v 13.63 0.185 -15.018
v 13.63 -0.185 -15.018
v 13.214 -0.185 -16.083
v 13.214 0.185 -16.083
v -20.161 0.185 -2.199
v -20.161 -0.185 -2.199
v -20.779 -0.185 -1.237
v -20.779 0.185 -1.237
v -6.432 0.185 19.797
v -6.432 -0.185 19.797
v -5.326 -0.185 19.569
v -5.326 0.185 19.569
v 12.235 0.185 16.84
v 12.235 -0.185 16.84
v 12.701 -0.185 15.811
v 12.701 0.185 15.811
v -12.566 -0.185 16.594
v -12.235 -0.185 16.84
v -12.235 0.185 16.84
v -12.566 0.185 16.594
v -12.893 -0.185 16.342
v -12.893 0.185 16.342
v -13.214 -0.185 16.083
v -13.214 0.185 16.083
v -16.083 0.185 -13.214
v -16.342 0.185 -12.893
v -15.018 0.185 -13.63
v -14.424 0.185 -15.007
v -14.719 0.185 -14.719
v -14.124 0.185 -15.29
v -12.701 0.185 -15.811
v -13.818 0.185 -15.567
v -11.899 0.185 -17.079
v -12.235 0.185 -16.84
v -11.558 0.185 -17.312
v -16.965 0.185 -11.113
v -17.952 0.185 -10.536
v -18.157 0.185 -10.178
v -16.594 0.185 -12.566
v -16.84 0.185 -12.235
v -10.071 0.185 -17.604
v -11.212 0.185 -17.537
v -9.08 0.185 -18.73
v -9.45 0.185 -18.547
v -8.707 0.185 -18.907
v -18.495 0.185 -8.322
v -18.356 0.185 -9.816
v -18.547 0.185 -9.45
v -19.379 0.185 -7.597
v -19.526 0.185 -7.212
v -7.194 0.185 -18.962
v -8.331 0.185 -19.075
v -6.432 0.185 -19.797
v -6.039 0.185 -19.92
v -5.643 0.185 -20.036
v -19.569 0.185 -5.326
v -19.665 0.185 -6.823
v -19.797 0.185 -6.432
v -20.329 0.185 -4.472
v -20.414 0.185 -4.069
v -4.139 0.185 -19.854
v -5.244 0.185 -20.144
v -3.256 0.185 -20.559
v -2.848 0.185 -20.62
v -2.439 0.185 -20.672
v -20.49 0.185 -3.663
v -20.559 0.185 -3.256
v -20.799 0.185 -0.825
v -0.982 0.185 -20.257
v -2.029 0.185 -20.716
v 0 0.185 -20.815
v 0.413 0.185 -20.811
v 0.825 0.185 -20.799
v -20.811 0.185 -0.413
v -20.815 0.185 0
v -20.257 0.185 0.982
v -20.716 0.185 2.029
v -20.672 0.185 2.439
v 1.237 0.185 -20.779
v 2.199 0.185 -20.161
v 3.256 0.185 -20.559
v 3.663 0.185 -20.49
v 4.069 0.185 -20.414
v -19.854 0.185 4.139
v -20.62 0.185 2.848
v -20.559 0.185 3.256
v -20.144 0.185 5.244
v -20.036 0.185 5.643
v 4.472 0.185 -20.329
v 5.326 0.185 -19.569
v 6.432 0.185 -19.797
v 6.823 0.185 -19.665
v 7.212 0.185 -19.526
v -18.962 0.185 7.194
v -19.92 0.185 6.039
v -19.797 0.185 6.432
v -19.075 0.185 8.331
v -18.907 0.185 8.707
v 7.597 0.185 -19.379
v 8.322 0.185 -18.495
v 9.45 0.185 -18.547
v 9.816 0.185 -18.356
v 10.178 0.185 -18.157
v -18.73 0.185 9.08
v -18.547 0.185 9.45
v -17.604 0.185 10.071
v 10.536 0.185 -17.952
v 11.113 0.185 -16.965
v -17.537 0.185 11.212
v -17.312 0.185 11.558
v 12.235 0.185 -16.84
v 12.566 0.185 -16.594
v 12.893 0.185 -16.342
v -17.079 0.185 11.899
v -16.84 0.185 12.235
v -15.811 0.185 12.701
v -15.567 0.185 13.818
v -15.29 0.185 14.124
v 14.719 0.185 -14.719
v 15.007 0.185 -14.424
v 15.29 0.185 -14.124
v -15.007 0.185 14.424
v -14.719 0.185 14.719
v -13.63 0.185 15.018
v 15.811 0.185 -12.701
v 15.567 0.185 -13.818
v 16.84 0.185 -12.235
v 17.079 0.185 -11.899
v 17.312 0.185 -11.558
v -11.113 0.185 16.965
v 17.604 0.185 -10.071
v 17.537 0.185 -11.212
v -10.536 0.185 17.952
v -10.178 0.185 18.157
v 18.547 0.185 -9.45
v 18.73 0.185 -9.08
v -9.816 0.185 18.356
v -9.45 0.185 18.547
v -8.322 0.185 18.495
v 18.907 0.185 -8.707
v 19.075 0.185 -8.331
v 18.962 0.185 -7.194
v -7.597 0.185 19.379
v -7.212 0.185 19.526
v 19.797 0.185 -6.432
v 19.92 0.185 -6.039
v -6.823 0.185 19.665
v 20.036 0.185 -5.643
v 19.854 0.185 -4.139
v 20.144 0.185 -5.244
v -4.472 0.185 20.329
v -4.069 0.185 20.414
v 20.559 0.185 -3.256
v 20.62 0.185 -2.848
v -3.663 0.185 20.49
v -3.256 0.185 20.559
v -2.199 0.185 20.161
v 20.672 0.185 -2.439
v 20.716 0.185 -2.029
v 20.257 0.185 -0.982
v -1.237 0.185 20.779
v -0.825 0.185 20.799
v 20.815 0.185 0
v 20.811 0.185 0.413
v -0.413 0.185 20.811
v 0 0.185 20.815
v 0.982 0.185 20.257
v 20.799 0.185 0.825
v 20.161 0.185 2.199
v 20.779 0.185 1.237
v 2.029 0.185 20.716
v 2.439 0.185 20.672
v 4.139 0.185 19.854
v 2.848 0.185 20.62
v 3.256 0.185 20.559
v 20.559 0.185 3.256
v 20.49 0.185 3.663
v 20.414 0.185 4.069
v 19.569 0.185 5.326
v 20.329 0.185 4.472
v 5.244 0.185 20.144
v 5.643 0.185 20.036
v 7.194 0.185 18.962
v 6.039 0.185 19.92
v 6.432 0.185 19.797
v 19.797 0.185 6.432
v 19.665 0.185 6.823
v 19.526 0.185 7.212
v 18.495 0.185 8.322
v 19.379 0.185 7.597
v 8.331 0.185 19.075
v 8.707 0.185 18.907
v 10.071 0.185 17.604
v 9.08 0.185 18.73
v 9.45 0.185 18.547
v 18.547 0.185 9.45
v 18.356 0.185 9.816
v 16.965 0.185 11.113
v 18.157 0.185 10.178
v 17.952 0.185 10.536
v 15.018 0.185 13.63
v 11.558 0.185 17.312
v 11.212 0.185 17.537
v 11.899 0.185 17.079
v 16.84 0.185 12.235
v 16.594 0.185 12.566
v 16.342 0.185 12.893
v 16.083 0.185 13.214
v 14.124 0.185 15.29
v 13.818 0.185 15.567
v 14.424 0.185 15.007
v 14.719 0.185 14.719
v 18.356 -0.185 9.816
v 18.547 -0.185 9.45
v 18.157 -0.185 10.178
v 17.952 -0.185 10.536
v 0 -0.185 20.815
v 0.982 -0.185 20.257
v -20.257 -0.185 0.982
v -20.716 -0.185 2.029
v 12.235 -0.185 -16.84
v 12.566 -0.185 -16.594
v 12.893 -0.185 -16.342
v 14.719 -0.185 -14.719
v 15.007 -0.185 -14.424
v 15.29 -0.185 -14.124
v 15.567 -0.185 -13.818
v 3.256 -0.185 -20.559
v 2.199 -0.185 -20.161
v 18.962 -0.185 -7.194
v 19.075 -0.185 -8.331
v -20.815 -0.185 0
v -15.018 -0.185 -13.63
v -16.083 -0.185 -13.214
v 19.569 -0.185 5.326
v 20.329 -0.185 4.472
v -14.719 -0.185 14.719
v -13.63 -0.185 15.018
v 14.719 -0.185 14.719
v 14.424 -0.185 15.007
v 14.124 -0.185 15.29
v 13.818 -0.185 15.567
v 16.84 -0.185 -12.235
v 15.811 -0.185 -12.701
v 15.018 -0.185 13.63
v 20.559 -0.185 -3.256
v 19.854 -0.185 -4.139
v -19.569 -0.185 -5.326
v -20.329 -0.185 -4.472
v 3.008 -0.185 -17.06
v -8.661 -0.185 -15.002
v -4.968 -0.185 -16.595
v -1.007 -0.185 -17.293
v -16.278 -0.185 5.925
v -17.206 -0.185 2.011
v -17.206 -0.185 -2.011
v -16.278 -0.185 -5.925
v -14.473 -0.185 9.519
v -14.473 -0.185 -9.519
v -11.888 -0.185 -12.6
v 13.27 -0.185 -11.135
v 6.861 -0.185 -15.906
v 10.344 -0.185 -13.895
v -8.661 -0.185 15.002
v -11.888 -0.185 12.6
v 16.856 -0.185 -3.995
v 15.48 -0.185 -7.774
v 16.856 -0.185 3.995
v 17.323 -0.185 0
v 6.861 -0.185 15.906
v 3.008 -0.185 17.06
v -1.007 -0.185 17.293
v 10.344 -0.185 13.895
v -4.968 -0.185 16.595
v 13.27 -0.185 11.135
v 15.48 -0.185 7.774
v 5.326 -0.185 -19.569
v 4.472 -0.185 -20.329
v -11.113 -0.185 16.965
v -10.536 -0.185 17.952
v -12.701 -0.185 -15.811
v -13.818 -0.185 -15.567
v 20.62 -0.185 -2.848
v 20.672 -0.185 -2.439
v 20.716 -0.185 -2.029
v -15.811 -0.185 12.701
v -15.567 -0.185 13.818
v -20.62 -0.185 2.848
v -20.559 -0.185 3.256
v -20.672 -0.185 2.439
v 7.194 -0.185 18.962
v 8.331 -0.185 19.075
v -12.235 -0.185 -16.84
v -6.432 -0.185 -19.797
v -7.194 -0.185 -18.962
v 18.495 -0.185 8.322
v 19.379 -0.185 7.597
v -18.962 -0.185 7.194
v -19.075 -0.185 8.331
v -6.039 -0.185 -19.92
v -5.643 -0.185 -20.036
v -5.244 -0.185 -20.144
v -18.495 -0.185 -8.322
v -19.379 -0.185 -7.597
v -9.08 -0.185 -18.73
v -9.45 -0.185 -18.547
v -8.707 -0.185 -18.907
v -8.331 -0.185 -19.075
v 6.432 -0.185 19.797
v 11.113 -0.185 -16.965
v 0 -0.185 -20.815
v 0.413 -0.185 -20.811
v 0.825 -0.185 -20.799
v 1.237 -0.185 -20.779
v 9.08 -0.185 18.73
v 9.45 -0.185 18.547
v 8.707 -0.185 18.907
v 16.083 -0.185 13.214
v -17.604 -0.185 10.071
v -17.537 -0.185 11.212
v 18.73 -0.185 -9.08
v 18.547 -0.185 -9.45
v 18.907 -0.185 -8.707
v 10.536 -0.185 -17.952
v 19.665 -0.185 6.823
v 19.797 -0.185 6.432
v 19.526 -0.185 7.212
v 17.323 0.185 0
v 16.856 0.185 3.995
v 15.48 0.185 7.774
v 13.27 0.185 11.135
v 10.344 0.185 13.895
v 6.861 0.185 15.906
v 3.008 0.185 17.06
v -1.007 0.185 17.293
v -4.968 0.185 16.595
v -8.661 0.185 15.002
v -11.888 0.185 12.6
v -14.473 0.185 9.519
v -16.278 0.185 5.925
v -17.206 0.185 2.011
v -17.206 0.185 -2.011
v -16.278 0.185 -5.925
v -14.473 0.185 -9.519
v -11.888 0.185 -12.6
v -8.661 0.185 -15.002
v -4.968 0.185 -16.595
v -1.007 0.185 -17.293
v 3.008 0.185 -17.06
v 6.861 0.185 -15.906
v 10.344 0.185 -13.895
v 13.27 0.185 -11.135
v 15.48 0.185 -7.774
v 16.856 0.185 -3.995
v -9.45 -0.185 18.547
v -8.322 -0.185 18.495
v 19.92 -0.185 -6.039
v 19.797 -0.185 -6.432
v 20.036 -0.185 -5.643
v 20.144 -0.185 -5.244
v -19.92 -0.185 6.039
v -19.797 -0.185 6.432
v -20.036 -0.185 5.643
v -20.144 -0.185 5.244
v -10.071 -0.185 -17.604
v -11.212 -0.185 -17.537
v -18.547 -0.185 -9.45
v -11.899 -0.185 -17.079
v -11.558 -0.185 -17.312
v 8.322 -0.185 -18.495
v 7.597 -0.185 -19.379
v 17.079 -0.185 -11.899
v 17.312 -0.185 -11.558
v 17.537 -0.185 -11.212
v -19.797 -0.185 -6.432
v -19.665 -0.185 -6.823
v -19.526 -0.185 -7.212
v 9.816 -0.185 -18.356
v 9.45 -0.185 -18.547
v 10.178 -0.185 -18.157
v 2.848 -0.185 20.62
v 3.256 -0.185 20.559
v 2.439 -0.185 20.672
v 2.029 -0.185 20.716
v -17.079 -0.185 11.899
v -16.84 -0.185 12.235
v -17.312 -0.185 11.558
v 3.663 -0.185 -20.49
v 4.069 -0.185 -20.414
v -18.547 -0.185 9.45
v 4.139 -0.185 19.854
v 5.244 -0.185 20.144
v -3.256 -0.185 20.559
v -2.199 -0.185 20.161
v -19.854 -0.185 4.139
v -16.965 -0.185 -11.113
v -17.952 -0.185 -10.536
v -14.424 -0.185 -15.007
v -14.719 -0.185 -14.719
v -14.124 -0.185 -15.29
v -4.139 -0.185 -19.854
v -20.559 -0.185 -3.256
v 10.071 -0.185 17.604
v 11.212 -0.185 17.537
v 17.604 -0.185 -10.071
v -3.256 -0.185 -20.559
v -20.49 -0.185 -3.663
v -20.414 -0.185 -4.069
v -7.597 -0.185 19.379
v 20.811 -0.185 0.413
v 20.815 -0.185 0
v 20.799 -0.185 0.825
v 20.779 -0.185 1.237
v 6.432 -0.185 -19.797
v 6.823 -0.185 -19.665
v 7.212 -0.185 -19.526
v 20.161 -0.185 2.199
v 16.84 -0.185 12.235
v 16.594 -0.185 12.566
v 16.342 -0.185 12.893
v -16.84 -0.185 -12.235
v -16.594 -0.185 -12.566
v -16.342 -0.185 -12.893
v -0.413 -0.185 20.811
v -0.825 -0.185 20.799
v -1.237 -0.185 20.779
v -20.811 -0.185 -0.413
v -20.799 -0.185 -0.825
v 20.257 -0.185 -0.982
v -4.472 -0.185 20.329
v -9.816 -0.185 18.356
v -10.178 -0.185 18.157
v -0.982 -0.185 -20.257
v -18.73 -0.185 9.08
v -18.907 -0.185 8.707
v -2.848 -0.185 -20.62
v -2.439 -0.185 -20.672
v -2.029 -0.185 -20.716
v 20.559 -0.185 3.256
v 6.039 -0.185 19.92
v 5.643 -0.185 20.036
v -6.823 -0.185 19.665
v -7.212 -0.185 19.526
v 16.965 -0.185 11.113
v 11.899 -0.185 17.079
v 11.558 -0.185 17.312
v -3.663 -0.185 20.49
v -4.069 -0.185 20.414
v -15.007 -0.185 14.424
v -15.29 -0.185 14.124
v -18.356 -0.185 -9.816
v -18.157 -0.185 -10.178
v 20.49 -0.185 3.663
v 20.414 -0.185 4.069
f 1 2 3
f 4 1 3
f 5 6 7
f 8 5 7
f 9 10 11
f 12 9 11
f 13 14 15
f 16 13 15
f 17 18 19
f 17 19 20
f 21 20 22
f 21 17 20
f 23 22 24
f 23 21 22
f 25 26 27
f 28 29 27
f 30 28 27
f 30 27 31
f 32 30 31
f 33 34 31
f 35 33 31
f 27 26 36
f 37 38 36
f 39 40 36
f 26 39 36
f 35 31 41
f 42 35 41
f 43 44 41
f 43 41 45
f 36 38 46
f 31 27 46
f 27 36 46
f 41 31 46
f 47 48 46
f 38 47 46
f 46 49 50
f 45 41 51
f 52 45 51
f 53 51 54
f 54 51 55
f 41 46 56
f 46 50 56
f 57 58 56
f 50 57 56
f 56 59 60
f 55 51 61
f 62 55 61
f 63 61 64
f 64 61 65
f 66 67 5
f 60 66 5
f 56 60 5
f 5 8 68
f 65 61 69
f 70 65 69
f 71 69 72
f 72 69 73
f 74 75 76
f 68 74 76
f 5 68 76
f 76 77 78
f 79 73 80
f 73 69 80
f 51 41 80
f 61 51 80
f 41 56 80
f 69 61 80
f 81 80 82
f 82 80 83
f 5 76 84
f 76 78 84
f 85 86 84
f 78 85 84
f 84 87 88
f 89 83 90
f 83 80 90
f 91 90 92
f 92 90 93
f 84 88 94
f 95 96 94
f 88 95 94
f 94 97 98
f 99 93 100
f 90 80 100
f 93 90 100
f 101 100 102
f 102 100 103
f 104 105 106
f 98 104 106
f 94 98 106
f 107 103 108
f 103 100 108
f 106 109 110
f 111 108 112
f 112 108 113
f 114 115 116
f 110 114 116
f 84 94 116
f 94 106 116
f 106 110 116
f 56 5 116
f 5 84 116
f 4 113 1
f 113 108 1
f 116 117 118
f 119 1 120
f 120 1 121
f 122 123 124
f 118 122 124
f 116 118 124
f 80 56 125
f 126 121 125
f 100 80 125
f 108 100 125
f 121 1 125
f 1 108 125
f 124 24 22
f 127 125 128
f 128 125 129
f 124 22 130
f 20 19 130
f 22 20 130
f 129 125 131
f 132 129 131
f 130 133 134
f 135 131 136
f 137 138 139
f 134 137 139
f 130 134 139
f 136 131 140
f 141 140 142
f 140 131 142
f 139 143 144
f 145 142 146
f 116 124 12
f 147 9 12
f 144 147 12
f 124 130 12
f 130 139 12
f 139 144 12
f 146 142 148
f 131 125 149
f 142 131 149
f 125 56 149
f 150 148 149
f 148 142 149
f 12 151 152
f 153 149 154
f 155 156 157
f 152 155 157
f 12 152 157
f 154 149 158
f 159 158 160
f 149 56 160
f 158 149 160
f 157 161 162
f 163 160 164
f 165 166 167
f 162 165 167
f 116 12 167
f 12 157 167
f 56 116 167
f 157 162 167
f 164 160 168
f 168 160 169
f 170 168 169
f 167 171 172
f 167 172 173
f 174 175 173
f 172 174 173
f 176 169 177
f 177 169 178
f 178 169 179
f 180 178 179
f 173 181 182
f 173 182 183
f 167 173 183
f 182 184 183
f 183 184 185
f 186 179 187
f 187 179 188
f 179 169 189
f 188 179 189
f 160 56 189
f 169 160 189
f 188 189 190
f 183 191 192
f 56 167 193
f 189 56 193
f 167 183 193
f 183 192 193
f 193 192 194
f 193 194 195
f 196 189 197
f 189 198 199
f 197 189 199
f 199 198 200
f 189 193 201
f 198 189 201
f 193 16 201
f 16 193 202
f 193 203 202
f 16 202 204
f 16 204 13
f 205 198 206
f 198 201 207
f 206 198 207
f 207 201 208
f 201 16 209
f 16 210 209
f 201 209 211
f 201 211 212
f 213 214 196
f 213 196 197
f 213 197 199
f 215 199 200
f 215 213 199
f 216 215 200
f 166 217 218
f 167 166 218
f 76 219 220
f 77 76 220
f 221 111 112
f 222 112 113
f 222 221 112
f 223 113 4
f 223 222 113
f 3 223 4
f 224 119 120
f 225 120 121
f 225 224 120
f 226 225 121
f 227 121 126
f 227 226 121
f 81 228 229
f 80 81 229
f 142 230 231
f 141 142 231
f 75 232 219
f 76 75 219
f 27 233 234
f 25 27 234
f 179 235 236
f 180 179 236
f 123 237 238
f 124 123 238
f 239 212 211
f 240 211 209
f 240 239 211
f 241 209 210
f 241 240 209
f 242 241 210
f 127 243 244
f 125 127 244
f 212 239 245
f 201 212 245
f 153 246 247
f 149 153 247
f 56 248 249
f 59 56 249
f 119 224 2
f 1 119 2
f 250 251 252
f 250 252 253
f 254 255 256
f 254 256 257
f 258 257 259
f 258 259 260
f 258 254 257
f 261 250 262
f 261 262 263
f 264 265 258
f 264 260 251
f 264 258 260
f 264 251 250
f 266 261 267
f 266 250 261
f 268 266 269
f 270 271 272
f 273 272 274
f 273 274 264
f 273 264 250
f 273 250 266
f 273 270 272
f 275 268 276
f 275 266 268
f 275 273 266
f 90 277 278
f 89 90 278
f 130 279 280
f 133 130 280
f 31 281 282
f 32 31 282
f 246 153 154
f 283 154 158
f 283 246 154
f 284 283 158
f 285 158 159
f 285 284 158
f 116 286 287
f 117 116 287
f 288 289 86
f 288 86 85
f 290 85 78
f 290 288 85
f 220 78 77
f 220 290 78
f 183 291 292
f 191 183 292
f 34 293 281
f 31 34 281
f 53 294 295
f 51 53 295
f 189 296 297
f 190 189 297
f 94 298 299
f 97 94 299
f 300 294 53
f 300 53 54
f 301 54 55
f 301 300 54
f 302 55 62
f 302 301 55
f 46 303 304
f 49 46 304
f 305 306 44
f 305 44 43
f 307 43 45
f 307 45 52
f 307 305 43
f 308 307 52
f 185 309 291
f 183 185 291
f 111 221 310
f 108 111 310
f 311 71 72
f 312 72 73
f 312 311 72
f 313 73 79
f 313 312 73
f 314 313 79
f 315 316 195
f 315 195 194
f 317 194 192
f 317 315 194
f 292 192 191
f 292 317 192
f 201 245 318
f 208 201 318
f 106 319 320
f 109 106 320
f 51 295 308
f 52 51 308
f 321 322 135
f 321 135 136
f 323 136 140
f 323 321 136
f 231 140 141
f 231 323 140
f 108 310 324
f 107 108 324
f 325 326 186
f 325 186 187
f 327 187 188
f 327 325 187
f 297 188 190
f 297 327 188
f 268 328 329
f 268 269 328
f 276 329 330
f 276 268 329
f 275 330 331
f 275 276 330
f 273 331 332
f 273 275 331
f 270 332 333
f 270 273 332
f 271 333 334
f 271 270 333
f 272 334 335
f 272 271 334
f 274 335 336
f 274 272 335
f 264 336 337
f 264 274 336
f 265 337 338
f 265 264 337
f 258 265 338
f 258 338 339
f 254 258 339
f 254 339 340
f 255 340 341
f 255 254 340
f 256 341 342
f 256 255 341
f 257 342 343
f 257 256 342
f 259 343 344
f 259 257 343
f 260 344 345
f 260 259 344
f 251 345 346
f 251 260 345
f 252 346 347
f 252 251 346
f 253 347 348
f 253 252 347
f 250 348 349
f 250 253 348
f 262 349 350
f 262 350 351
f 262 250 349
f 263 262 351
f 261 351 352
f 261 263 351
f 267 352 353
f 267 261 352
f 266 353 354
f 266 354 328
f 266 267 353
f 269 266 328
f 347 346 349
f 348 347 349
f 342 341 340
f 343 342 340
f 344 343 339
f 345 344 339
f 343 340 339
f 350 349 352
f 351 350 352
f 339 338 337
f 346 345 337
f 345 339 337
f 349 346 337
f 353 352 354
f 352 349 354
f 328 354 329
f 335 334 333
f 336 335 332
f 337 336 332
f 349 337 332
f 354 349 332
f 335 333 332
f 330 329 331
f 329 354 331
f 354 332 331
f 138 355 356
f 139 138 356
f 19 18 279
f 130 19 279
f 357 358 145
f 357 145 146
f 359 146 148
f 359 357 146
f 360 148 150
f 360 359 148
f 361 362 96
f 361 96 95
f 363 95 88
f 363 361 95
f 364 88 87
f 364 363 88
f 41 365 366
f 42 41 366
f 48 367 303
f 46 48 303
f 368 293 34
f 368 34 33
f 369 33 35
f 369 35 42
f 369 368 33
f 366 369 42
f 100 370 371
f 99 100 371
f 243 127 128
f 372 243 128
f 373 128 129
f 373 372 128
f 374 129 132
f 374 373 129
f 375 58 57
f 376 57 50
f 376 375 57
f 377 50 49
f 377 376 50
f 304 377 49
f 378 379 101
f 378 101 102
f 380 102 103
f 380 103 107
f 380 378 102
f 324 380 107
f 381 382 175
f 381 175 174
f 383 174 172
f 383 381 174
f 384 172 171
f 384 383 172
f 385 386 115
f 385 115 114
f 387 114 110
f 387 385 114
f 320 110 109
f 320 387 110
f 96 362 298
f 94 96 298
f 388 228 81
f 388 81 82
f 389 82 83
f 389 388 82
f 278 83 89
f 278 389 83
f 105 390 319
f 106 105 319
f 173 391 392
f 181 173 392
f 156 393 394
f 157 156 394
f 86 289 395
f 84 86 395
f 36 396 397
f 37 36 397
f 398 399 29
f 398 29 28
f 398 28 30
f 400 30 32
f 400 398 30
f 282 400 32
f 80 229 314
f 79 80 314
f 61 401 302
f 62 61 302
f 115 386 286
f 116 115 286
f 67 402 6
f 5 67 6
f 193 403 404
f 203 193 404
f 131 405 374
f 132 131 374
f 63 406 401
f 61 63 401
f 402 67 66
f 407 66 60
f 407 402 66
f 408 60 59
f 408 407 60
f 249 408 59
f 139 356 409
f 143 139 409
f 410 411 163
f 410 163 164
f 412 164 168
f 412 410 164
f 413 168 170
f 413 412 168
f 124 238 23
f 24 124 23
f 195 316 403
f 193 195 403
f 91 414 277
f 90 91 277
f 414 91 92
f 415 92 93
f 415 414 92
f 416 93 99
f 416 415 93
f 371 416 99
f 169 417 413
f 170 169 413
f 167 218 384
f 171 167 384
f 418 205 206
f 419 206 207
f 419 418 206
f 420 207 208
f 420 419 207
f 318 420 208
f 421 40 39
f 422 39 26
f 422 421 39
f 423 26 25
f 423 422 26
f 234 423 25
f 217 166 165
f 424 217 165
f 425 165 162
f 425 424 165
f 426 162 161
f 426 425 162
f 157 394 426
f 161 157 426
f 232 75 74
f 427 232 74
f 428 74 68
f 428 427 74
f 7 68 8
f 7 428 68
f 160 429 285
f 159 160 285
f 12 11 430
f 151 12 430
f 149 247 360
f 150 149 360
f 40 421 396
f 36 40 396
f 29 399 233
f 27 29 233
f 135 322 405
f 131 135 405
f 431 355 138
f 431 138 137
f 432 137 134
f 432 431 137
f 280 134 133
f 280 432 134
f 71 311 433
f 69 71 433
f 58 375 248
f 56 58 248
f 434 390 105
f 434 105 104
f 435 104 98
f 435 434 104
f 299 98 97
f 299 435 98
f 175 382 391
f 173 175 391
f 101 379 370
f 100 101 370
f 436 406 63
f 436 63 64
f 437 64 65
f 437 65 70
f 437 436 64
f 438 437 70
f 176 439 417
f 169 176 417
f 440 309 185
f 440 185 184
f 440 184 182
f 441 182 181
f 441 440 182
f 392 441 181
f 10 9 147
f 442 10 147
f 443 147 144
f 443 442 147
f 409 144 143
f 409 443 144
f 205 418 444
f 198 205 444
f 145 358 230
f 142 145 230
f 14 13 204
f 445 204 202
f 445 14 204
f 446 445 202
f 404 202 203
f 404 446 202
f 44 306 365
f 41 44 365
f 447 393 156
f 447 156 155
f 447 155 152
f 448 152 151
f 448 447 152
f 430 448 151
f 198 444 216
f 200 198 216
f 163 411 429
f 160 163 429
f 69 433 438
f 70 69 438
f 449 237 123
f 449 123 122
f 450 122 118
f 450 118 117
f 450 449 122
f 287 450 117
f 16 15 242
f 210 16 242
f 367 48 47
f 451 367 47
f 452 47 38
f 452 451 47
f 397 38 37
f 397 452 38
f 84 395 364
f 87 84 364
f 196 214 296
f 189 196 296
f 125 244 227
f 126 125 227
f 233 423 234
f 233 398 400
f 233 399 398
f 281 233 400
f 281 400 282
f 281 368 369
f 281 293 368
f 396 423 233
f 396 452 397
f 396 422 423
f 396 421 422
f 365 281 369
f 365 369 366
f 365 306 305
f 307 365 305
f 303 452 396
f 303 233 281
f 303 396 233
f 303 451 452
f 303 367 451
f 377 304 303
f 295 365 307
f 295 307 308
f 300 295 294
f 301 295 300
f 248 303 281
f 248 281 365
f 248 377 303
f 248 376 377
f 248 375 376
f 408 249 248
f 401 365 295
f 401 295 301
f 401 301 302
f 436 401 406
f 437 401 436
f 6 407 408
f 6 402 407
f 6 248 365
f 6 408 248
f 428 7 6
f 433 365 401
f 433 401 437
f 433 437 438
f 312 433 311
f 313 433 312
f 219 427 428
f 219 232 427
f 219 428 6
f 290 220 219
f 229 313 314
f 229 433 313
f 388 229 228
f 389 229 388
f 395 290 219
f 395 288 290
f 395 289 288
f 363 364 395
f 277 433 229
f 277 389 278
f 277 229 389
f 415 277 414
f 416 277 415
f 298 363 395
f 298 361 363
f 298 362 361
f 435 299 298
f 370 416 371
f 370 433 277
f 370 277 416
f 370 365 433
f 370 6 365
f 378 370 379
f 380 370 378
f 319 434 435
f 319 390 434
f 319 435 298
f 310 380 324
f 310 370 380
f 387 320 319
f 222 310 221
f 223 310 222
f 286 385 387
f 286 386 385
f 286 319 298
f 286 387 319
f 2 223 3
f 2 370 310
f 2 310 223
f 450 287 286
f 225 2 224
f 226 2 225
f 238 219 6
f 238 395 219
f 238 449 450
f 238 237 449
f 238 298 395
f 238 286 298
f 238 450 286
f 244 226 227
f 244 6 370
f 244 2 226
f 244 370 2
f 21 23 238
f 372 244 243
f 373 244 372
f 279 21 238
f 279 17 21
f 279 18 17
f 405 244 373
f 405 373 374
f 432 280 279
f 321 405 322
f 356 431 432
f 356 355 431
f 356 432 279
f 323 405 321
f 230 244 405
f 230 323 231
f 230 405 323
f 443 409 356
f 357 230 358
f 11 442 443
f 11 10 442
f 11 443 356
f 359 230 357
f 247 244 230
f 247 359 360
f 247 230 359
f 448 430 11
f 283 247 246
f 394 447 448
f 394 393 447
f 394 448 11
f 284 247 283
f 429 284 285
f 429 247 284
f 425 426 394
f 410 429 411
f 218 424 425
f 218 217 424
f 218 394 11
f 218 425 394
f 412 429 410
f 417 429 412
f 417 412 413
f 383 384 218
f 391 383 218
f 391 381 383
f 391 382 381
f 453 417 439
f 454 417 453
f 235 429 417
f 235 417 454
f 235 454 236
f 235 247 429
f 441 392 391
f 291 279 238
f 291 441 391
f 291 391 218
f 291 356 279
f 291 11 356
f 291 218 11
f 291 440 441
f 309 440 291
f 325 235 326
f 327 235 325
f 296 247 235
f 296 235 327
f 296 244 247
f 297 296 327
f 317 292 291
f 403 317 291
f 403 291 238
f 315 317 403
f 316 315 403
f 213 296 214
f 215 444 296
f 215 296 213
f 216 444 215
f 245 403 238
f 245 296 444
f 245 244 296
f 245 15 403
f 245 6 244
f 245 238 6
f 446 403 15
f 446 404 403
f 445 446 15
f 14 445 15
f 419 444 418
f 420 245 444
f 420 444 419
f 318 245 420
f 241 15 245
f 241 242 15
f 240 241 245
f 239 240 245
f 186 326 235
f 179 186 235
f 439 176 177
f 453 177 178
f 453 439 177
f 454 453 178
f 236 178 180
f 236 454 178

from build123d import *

# Parameters (mm, degrees)
F0_R            = 17.3228
F2_DEPTH        = 0.18542
F1_R            = 20.8153
F4_DEPTH        = 0.37184
F4_COPIES_COUNT = 40


# Not quite as in the source:
# - a feature of the source that left no trace in its solid (it failed there, or was rolled back) is left out
# - a pattern or mirror of a feature is missing from the dataset's text; its kind, count and spacing are read off the source's solid


with BuildPart() as f2:
    # F0 (on Front) → F2 (new body, symmetric)
    with BuildSketch(Plane.XZ):
        Circle(F0_R)
    extrude(amount=F2_DEPTH, both=True)


with BuildPart() as f2b:
    # F1 (on Front) → F2, piece 2 (new body, symmetric)
    with BuildSketch(Plane.XZ):
        Circle(F1_R)
    extrude(amount=F2_DEPTH, both=True)

    # F3 (on face) → F4 (cut, through all)
    with BuildSketch(Plane.XZ.offset(0.18542)):
        with BuildLine():
            ThreePointArc((2.0285952307, 20.7162138307), (1.0155068536, 20.7905137002), (0, 20.8153))
            Line((0, 20.8153), (0.9818294189, 20.2571600918))
            Line((0.9818294189, 20.2571600918), (2.0285952307, 20.7162138307))
        make_face()
    f4 = extrude(amount=-F4_DEPTH, mode=Mode.SUBTRACT)

    # F4_copies: F4 ×40 about axis
    f4_copies_axis = Axis((0, 0, 0), (0, 1, 0))
    for i in range(1, F4_COPIES_COUNT):
        add(f4.rotate(f4_copies_axis, i * 360 / F4_COPIES_COUNT), mode=Mode.SUBTRACT)


solid = Compound([f2.part, f2b.part])
